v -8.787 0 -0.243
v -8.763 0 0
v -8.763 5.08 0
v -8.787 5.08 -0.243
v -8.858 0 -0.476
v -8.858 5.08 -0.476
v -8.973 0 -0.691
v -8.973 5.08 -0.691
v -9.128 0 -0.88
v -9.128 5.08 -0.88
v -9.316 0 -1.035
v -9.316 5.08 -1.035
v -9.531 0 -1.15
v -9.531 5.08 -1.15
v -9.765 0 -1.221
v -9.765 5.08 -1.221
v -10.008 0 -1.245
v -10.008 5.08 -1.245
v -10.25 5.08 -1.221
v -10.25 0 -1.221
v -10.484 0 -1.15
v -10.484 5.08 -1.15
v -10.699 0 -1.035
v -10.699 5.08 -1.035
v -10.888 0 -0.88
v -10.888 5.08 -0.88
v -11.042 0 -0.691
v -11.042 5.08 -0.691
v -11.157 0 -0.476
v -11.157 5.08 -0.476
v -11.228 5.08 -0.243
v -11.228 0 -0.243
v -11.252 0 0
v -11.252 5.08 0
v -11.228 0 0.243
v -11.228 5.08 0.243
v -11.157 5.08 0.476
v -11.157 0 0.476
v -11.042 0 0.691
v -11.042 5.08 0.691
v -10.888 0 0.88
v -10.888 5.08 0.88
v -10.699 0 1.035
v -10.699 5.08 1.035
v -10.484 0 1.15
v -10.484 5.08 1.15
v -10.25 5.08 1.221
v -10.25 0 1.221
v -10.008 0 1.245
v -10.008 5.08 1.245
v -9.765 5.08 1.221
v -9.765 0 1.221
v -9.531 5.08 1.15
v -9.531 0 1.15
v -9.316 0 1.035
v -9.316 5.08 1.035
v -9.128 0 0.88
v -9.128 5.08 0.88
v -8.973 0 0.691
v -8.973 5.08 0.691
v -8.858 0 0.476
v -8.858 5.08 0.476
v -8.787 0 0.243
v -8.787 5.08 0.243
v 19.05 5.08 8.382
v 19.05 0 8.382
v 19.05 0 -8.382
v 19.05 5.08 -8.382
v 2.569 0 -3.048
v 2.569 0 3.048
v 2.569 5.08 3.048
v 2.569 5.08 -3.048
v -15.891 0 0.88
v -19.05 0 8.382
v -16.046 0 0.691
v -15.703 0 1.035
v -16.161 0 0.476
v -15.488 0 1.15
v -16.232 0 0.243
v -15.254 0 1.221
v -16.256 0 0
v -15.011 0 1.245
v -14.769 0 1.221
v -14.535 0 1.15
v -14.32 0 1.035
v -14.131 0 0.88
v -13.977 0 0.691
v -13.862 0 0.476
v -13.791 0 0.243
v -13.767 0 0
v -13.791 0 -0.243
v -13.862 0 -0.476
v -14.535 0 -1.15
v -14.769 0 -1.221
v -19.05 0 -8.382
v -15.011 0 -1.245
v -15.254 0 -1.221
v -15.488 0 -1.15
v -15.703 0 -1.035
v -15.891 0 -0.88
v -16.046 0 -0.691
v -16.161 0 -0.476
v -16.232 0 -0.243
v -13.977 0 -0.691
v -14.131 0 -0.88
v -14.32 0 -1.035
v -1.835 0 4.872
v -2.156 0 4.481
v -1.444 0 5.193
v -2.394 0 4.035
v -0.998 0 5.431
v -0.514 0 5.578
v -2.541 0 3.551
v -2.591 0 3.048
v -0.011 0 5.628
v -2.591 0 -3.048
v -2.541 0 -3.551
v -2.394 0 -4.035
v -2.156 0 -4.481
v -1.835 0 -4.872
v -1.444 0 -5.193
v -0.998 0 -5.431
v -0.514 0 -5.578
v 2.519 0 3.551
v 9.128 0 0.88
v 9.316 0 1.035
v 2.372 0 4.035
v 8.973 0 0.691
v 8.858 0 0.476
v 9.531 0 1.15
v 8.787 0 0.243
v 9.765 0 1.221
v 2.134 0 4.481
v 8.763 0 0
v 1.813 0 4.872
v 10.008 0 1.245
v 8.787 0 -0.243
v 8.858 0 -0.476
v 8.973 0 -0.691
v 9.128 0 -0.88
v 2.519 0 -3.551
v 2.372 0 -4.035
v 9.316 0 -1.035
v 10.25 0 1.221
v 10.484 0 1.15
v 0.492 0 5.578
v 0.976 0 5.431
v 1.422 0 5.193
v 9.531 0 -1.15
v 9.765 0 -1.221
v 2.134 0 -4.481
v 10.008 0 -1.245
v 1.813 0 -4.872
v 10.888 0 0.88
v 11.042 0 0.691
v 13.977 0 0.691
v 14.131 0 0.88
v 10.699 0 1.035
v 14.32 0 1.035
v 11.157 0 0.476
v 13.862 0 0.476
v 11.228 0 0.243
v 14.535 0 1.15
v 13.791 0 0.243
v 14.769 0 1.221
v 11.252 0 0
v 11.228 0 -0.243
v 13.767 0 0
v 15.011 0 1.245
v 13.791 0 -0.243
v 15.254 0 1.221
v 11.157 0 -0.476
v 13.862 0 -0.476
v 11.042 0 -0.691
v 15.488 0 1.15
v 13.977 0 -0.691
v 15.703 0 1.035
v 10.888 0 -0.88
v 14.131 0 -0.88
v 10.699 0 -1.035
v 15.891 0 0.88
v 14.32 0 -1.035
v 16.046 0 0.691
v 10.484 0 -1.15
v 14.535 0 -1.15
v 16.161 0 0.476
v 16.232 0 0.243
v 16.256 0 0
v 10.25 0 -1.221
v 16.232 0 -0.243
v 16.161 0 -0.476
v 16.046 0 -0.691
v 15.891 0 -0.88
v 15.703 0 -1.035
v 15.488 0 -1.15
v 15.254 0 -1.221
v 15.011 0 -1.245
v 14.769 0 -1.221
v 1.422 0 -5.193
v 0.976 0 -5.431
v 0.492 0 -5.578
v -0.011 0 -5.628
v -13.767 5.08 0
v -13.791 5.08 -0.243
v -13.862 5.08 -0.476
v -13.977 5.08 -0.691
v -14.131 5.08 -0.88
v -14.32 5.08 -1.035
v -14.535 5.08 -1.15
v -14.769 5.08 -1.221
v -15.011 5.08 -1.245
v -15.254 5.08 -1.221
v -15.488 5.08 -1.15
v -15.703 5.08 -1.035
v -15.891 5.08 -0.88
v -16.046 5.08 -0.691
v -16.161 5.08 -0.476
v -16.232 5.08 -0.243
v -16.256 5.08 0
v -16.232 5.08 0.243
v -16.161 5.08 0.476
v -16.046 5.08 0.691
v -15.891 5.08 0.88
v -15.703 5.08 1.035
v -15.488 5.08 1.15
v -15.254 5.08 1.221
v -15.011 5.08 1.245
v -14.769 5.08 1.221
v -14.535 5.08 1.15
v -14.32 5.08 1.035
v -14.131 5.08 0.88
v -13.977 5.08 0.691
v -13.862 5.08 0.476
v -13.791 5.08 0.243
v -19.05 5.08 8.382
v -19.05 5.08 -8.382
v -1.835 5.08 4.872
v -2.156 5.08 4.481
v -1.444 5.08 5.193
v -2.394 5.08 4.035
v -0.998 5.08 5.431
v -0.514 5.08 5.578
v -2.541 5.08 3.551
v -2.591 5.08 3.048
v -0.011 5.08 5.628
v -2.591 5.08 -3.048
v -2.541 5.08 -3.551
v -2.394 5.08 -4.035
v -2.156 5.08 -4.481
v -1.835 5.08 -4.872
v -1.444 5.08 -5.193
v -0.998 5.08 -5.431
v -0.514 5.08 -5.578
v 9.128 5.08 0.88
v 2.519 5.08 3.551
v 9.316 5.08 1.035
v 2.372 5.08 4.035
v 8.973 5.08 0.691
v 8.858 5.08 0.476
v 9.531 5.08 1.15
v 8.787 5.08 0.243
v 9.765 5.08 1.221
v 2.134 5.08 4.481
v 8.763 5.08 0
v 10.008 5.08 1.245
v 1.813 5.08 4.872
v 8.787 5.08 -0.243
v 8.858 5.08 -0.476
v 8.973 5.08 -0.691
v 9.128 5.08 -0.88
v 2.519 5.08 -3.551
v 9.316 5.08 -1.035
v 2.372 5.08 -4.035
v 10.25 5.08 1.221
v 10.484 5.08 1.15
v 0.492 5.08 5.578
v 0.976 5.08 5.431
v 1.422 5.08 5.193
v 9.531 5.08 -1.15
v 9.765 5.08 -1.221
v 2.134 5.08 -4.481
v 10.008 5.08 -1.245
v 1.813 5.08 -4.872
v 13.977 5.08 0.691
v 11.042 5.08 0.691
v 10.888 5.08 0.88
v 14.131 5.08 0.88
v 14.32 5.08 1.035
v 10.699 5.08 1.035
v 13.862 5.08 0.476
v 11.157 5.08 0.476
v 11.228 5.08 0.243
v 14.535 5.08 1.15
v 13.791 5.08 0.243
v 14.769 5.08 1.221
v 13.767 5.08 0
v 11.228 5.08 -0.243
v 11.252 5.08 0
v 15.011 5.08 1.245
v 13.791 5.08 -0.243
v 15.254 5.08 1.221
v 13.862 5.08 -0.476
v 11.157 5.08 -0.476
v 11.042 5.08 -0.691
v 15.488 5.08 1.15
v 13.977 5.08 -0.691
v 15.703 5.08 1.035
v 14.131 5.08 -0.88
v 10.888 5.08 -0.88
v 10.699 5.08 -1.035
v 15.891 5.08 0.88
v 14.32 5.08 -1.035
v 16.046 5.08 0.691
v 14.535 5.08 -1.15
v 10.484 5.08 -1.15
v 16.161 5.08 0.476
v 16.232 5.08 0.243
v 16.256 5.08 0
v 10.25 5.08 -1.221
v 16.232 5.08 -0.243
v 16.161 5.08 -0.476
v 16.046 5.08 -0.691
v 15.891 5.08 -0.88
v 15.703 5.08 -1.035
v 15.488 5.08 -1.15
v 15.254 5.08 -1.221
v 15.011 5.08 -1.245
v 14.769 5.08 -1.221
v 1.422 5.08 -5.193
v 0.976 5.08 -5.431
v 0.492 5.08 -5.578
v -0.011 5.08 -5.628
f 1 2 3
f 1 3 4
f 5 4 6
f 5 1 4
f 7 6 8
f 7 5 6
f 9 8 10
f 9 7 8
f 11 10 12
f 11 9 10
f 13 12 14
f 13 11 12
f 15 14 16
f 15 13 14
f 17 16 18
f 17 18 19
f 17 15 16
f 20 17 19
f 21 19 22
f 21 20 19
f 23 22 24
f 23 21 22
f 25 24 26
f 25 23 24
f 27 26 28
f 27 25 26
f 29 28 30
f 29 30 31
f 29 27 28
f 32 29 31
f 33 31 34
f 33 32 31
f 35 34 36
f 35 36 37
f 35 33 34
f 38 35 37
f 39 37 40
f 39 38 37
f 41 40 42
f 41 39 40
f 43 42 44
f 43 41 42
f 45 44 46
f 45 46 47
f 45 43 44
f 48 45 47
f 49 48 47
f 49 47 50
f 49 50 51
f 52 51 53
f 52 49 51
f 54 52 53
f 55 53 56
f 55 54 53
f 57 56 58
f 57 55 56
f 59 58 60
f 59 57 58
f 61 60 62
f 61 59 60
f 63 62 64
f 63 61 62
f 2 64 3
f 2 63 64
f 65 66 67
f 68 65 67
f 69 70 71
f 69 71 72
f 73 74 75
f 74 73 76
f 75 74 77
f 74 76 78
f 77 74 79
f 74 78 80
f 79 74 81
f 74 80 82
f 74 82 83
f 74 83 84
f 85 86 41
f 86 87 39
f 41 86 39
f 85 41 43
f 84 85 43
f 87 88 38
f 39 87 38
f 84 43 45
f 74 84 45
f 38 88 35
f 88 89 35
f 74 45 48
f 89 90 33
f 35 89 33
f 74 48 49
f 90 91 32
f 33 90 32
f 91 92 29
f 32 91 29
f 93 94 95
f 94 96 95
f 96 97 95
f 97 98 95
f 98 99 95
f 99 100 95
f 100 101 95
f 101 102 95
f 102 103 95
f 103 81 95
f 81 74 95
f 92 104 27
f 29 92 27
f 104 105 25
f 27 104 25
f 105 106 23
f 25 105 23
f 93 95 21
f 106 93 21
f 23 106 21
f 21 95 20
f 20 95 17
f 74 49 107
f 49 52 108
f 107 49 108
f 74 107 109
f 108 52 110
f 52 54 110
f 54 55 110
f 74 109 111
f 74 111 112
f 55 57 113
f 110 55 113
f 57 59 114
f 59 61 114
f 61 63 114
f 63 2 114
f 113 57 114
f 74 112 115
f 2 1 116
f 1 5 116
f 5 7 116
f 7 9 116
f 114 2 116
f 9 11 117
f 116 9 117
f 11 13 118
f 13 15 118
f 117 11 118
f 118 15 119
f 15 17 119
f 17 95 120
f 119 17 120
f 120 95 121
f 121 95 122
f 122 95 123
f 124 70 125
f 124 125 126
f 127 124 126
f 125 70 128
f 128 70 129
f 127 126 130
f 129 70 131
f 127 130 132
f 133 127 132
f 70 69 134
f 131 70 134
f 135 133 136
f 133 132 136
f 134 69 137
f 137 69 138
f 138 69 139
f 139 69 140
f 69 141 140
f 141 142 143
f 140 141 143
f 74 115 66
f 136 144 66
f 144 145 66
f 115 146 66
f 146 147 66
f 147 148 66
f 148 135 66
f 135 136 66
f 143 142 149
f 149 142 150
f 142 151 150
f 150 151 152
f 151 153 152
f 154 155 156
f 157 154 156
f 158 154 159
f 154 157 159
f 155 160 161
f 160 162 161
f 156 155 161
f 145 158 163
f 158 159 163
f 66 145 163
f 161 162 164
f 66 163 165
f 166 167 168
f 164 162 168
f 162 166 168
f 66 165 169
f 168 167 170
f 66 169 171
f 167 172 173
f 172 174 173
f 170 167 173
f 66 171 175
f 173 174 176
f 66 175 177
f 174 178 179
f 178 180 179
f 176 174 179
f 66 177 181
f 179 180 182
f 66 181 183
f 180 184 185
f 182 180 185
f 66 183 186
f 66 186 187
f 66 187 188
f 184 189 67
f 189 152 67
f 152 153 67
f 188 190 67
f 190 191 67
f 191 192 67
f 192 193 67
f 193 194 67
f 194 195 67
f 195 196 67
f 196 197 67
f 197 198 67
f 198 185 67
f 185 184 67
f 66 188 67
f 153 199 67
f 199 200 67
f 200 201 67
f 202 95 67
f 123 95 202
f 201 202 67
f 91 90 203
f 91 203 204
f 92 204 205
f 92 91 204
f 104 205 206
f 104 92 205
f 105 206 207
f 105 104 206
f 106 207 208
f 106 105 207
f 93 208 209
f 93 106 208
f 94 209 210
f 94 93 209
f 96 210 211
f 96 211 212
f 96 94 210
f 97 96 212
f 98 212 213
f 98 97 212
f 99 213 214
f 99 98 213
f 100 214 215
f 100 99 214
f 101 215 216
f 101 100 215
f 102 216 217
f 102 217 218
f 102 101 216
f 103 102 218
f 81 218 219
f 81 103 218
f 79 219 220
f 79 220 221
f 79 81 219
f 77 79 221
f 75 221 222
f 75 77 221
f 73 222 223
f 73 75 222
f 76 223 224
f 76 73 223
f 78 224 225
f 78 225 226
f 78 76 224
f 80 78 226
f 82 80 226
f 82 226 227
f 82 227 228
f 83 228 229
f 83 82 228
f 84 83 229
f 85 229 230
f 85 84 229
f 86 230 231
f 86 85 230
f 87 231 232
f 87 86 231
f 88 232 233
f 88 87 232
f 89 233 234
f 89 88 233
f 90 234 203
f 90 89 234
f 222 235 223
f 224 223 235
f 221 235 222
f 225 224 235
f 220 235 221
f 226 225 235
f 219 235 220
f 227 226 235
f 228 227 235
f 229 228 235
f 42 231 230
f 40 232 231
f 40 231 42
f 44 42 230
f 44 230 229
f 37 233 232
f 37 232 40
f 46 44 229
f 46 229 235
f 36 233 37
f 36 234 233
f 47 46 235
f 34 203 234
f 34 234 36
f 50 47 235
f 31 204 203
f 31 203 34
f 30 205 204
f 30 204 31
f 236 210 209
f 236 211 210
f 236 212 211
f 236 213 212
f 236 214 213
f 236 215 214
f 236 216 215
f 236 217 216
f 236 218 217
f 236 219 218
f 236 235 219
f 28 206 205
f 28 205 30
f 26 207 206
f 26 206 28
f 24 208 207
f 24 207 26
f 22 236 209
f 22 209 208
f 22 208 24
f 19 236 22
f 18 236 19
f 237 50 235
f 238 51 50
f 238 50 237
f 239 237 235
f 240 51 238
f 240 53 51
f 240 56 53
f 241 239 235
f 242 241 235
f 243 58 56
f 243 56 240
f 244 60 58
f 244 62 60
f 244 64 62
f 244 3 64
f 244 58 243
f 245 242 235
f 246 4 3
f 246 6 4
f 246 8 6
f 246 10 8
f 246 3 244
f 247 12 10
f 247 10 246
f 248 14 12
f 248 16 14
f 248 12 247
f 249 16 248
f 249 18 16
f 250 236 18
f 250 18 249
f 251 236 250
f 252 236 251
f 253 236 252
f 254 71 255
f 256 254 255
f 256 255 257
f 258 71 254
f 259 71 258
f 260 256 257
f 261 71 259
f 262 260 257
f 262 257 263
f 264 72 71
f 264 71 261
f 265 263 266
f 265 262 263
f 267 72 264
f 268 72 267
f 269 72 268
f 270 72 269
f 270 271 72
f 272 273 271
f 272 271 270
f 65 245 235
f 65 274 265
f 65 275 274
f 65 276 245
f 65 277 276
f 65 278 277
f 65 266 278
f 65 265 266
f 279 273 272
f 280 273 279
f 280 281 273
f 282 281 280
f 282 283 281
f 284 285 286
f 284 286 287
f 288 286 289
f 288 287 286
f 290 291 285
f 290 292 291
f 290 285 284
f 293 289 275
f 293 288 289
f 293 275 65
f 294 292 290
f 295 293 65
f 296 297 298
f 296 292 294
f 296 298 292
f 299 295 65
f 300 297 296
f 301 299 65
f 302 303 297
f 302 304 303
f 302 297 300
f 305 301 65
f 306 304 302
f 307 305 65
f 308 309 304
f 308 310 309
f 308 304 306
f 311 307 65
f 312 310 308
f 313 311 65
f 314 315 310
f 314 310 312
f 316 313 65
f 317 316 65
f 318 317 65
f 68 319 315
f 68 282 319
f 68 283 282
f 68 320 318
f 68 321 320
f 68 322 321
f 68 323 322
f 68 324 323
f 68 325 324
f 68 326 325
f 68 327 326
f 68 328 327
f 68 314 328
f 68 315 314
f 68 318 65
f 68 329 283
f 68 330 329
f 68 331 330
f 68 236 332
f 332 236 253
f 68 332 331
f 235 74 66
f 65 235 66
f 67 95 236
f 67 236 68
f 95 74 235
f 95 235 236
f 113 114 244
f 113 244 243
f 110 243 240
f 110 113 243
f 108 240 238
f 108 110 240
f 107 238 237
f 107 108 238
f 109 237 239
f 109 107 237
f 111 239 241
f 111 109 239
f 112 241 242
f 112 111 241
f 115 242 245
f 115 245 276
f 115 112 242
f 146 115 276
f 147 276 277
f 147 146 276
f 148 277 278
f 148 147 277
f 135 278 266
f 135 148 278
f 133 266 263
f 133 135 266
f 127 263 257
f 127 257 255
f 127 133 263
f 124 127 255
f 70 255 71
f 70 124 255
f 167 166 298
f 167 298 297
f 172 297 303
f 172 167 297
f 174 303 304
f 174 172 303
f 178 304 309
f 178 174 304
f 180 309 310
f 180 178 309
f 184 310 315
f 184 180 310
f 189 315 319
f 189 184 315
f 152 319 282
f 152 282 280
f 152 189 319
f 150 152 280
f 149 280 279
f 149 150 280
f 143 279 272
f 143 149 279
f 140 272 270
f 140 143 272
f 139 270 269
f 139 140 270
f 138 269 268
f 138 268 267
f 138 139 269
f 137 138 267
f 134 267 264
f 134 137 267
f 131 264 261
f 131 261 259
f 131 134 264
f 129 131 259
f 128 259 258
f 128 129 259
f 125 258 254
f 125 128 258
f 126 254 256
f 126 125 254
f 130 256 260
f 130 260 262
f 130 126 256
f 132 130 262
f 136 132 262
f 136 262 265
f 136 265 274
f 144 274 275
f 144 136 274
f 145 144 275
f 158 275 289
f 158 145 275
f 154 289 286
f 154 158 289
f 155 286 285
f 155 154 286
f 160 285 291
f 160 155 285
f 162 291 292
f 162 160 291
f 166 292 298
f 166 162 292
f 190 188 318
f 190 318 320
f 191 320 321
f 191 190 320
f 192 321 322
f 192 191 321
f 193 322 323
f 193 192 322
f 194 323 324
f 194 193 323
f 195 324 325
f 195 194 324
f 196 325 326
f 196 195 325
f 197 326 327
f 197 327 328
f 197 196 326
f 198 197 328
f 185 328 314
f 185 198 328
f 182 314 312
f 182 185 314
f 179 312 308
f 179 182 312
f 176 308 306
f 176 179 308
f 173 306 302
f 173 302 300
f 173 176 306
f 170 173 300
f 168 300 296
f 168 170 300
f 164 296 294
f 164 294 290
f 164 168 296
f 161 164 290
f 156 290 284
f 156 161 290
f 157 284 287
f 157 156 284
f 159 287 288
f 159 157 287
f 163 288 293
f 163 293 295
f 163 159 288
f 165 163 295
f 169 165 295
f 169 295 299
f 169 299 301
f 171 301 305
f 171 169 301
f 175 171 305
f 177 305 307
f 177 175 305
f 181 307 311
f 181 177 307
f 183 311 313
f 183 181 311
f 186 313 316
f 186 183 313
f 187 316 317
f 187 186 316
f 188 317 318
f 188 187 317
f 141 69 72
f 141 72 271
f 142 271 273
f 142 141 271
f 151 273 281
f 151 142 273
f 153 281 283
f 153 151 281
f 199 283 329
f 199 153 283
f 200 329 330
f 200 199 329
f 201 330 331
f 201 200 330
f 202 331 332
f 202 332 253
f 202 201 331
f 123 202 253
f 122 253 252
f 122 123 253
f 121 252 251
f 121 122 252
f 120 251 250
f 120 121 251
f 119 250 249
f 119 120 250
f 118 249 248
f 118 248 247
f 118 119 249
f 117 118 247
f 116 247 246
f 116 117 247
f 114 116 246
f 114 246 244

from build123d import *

# Parameters (mm, degrees)
SKETCH1_W           = 38.1
SKETCH1_H           = 16.764
SKETCH1_R           = 1.2446
BOSS_EXTRUDE1_DEPTH = 5.08


with BuildPart() as part:
    # Sketch1 → Boss-Extrude1 (new body)
    with BuildSketch(Plane(origin=(0, 0, 0), x_dir=(1, 0, 0), z_dir=(0, 1, 0))):
        Rectangle(SKETCH1_W, SKETCH1_H)
        with Locations((-10.0076, 0)):
            Circle(SKETCH1_R, mode=Mode.SUBTRACT)
        with Locations((-15.0114, 0)):
            Circle(SKETCH1_R, mode=Mode.SUBTRACT)
        with Locations((15.0114, 0)):
            Circle(SKETCH1_R, mode=Mode.SUBTRACT)
        with Locations((10.0076, 0)):
            Circle(SKETCH1_R, mode=Mode.SUBTRACT)
        with BuildLine():
            Line((2.568575, -3.048), (2.568575, 3.048))
            ThreePointArc((2.568575, 3.048), (-0.0111125, 5.6276875), (-2.5908, 3.048))
            Line((-2.5908, 3.048), (-2.5908, -3.048))
            ThreePointArc((-2.5908, -3.048), (-0.0111125, -5.6276875), (2.568575, -3.048))
        make_face(mode=Mode.SUBTRACT)
    extrude(amount=BOSS_EXTRUDE1_DEPTH)


solid = part.part
